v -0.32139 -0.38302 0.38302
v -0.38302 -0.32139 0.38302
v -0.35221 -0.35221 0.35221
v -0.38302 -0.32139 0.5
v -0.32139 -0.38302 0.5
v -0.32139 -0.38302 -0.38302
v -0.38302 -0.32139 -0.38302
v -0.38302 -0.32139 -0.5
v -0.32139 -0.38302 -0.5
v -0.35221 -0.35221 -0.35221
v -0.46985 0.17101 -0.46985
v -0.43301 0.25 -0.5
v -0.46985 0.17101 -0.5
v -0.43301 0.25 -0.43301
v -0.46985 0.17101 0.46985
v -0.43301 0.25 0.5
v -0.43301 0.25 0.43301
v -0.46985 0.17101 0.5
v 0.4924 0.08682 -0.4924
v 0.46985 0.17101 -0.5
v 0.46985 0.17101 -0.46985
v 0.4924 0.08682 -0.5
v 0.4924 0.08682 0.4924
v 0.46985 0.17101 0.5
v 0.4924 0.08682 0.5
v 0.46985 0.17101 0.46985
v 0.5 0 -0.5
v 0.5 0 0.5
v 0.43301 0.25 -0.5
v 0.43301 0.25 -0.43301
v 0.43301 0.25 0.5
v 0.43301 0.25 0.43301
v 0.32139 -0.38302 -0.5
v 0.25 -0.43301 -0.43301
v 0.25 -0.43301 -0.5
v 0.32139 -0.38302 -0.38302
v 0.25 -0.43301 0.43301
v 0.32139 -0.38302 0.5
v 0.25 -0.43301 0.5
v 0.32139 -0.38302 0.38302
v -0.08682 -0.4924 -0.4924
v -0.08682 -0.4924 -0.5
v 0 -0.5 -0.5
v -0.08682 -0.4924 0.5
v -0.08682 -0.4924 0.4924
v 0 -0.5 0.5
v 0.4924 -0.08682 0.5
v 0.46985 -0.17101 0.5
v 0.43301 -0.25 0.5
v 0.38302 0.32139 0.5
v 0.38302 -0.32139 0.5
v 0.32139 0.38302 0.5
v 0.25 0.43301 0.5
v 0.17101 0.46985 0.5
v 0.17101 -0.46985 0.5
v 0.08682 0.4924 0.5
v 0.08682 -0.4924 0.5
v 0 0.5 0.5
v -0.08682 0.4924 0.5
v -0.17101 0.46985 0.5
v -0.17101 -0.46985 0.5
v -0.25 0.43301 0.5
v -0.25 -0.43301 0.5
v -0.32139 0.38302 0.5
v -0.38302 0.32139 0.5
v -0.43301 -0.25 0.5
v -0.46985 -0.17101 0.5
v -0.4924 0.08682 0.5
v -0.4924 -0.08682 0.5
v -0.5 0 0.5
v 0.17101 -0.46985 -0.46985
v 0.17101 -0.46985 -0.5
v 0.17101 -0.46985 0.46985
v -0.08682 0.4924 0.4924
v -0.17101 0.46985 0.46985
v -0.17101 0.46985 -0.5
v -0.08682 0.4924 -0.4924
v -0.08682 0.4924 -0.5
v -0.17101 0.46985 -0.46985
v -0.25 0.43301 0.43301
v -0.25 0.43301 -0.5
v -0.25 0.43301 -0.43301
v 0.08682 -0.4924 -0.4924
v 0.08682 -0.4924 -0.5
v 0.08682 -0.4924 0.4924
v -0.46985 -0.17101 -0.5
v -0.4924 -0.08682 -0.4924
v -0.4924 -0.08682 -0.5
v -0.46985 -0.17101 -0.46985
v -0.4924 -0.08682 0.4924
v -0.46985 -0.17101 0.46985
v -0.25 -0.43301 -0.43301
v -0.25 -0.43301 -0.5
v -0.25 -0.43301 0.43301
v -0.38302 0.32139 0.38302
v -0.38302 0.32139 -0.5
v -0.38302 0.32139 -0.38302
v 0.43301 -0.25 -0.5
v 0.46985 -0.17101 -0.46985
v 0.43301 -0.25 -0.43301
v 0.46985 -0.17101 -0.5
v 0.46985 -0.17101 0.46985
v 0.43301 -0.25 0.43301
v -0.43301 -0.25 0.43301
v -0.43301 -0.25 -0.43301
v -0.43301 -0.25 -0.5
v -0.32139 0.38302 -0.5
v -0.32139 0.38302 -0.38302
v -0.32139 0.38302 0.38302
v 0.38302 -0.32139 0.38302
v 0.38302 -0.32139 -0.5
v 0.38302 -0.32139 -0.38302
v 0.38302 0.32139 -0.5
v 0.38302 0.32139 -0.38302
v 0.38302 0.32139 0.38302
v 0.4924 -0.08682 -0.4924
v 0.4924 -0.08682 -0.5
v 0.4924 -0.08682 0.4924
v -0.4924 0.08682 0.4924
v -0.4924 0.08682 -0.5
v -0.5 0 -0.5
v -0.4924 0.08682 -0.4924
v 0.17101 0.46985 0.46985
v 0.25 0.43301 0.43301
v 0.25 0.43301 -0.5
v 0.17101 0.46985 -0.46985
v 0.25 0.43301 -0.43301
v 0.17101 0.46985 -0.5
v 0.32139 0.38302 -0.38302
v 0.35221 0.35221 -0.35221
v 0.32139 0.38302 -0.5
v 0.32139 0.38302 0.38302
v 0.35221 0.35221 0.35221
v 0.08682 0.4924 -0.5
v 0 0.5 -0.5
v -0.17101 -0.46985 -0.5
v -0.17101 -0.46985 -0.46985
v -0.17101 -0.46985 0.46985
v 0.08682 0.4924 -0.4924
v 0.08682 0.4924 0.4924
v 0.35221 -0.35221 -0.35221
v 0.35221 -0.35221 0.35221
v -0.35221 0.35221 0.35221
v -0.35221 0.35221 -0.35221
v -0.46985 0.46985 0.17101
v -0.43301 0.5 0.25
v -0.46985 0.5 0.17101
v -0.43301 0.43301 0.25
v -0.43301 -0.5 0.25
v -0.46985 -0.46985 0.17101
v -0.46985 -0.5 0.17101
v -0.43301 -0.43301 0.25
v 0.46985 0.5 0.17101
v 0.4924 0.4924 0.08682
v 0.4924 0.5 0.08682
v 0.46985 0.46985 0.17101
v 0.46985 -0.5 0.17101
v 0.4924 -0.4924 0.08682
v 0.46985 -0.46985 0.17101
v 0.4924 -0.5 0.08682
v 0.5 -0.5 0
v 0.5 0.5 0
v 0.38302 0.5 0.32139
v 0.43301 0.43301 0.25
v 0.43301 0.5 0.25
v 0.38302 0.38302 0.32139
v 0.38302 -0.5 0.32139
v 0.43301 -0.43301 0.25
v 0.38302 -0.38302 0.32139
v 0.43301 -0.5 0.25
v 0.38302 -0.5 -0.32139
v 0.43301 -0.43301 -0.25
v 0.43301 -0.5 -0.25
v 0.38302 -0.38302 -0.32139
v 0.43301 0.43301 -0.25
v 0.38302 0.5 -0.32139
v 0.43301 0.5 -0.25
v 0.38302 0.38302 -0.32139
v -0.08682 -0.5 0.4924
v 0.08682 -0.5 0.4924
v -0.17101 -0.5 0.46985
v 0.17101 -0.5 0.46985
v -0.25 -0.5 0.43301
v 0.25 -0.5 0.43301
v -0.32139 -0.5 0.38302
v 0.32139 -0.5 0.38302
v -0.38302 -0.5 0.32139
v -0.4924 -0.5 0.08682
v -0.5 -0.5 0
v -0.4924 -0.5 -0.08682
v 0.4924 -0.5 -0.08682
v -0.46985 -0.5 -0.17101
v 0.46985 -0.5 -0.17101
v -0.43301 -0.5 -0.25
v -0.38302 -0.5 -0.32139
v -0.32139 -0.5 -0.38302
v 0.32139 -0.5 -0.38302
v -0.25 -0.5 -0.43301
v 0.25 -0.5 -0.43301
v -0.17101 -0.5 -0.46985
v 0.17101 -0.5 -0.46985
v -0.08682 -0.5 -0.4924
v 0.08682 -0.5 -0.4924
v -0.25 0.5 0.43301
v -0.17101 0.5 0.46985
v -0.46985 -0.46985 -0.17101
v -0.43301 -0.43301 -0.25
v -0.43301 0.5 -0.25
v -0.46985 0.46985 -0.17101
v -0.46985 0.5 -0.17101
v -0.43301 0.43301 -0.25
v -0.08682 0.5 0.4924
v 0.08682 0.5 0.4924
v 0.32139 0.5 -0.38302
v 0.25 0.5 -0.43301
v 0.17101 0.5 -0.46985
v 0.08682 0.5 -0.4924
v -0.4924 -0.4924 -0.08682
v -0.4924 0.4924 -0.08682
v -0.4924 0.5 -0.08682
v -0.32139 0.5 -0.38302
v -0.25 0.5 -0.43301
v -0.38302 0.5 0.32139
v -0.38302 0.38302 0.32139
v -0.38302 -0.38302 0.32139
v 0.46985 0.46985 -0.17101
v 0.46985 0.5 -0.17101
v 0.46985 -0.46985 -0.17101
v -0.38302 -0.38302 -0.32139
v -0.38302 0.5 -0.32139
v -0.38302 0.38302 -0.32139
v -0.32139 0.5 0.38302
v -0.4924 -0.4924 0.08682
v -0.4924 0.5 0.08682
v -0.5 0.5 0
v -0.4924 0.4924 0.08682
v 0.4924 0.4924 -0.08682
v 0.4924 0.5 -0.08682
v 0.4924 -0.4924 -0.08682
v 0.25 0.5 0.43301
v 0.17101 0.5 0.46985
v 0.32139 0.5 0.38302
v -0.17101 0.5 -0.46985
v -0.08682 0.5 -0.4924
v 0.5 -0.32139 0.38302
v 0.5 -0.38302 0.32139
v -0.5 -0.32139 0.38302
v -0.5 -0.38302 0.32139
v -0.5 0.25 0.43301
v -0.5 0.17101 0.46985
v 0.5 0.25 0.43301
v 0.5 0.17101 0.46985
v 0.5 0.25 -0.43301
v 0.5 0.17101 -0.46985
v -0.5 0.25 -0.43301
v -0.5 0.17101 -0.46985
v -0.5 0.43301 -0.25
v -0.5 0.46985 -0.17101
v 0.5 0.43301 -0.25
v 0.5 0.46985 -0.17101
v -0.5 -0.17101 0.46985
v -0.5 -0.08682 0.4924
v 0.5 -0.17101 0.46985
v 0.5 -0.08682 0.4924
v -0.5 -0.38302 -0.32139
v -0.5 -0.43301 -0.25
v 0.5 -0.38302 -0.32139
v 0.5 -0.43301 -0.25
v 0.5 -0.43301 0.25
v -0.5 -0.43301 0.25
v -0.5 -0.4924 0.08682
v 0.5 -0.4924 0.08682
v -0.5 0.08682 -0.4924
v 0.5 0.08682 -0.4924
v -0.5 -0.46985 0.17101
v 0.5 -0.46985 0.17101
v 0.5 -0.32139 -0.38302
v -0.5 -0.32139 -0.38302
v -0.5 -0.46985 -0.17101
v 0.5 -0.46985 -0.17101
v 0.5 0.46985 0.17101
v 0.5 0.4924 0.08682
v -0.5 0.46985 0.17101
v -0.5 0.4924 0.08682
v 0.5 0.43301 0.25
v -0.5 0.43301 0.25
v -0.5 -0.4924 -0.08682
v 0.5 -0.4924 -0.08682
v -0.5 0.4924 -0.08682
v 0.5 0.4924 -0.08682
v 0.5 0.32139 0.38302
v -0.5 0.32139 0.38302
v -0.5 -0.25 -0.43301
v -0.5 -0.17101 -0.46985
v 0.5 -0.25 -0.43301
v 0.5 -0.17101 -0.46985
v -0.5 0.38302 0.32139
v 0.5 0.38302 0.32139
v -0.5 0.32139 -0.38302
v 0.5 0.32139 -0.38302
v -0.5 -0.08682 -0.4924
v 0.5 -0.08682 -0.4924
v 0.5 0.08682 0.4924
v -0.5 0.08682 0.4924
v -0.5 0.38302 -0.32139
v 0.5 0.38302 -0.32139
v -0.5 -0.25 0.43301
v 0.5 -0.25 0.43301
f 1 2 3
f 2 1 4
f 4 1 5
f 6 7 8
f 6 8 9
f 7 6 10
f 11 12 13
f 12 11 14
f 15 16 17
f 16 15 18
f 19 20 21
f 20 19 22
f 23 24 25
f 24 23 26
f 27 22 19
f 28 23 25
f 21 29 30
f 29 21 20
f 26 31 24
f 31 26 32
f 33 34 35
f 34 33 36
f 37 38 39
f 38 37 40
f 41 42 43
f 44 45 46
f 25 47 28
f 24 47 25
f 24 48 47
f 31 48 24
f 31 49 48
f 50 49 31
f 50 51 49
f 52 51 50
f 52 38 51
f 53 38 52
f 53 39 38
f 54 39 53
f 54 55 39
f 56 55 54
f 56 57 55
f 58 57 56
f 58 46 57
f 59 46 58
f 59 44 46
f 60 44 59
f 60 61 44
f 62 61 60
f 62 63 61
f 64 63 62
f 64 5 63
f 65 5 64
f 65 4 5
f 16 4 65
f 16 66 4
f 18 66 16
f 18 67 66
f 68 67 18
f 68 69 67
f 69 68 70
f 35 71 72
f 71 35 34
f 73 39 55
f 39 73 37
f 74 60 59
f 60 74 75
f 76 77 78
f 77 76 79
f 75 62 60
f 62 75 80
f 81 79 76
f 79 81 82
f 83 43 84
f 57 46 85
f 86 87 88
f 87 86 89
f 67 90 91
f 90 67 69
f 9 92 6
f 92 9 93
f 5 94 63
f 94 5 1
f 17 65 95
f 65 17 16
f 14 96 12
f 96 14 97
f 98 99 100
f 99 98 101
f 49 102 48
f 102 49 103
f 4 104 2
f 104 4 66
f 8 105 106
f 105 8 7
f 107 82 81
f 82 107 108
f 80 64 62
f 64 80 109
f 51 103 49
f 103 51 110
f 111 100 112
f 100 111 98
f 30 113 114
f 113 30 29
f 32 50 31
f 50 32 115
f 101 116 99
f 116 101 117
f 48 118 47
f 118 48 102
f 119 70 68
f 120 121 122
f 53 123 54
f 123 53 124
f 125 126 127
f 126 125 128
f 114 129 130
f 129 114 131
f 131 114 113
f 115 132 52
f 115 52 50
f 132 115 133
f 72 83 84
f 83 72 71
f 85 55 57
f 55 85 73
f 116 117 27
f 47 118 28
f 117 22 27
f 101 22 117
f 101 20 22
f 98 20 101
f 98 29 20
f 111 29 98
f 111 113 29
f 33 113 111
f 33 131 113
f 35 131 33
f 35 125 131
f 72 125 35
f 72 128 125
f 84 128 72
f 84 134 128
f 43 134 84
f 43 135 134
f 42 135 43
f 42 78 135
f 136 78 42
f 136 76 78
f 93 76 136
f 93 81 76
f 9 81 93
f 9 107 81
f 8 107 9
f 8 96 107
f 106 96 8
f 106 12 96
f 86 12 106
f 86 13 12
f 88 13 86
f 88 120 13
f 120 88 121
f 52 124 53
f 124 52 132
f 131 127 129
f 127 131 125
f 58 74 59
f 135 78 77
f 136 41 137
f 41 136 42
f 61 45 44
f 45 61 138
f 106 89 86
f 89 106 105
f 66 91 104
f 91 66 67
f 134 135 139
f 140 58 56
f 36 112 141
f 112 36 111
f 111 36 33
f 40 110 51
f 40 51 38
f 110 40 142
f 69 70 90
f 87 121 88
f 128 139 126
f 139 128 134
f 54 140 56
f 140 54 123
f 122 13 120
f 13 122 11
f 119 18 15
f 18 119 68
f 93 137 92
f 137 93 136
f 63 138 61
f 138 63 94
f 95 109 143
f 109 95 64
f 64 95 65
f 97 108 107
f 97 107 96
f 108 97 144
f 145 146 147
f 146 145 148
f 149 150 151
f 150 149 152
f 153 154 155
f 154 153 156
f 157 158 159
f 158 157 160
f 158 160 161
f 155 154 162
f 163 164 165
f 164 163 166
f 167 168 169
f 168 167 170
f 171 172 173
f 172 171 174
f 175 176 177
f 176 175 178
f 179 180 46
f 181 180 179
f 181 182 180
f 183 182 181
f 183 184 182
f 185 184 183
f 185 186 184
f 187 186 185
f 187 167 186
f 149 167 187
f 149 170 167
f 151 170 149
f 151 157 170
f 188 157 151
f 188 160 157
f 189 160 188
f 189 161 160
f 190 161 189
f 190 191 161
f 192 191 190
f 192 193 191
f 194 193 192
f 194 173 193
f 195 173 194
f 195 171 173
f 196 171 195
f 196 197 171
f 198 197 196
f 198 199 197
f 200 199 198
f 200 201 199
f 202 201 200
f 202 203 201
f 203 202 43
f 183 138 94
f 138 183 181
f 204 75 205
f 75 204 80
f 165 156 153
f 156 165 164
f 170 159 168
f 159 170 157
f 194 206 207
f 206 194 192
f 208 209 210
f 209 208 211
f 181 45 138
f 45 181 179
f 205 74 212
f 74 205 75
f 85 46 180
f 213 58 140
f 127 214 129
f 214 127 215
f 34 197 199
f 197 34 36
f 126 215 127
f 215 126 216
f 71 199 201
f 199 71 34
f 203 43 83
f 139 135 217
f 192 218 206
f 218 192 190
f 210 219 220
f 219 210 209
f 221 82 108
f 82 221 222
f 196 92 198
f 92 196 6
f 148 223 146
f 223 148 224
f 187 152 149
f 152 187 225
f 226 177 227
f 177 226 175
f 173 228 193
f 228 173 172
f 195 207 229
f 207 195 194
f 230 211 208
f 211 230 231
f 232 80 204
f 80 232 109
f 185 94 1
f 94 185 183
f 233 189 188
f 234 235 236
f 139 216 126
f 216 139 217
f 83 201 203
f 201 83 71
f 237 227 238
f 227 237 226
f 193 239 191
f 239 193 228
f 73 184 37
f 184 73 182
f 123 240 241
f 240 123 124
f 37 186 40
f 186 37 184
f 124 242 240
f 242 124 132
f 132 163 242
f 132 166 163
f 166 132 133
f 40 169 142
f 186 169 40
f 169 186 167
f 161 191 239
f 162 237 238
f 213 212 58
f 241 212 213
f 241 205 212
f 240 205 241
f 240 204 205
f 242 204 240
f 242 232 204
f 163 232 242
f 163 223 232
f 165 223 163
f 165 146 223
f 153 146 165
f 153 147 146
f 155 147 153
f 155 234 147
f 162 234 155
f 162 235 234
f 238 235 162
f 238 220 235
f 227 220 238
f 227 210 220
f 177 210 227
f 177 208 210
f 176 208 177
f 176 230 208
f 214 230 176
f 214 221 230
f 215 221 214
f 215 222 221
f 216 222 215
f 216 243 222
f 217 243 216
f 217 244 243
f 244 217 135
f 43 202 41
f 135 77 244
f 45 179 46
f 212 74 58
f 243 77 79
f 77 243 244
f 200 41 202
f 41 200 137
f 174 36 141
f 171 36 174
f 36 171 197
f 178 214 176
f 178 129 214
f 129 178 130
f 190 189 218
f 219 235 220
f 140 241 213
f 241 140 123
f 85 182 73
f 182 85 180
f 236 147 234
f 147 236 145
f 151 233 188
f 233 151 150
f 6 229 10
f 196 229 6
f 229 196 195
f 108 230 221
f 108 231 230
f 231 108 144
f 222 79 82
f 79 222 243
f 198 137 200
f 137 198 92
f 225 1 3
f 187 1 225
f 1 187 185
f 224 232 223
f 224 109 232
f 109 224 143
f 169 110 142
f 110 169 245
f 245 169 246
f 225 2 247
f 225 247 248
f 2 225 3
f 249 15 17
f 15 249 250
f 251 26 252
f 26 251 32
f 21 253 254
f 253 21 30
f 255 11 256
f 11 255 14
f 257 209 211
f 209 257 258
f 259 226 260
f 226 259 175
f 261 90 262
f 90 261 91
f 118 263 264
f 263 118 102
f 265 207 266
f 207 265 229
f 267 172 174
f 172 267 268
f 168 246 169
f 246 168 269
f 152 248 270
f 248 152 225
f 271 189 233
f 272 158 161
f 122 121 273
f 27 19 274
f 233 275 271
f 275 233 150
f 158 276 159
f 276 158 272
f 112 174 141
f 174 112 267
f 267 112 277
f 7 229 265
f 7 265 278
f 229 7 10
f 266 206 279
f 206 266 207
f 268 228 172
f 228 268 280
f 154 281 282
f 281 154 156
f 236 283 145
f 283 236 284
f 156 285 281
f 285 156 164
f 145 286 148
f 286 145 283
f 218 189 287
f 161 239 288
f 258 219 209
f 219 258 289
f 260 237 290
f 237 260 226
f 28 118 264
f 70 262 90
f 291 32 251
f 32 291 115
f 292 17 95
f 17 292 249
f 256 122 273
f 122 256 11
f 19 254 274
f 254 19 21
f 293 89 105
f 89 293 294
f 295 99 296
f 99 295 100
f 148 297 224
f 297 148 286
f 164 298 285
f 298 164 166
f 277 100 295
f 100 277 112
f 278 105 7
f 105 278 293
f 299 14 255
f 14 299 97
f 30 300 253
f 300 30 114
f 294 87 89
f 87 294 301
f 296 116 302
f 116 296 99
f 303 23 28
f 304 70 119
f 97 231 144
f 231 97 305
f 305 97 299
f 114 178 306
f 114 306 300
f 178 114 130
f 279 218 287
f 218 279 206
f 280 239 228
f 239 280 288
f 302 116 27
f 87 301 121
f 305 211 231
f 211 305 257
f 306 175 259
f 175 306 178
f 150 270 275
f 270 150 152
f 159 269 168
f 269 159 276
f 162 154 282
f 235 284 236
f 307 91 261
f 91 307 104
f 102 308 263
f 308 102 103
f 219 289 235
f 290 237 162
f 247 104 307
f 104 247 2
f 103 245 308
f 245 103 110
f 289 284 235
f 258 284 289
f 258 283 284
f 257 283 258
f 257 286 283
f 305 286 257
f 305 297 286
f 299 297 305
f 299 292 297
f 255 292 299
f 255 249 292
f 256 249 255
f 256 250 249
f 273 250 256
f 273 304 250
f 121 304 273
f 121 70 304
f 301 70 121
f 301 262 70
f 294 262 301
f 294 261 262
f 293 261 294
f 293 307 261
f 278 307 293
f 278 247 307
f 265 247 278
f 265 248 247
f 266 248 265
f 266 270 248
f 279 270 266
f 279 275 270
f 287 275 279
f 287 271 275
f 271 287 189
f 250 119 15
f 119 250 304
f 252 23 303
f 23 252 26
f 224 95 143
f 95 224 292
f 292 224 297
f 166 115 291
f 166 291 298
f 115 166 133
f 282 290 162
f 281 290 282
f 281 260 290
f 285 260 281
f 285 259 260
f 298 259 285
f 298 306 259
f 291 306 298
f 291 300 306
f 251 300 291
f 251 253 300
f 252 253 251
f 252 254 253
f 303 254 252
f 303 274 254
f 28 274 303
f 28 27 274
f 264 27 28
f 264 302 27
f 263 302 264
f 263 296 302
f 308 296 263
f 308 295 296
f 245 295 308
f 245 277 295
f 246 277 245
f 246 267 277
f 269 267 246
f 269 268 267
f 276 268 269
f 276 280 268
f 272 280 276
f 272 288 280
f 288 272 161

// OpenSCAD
$fn=36;
diameter=1;
length=1;

cylinder(d=diameter,h=length,center=true);
rotate([90,0,0])
cylinder(d=diameter,h=length,center=true);
rotate([0,90,0])
cylinder(d=diameter,h=length,center=true);
